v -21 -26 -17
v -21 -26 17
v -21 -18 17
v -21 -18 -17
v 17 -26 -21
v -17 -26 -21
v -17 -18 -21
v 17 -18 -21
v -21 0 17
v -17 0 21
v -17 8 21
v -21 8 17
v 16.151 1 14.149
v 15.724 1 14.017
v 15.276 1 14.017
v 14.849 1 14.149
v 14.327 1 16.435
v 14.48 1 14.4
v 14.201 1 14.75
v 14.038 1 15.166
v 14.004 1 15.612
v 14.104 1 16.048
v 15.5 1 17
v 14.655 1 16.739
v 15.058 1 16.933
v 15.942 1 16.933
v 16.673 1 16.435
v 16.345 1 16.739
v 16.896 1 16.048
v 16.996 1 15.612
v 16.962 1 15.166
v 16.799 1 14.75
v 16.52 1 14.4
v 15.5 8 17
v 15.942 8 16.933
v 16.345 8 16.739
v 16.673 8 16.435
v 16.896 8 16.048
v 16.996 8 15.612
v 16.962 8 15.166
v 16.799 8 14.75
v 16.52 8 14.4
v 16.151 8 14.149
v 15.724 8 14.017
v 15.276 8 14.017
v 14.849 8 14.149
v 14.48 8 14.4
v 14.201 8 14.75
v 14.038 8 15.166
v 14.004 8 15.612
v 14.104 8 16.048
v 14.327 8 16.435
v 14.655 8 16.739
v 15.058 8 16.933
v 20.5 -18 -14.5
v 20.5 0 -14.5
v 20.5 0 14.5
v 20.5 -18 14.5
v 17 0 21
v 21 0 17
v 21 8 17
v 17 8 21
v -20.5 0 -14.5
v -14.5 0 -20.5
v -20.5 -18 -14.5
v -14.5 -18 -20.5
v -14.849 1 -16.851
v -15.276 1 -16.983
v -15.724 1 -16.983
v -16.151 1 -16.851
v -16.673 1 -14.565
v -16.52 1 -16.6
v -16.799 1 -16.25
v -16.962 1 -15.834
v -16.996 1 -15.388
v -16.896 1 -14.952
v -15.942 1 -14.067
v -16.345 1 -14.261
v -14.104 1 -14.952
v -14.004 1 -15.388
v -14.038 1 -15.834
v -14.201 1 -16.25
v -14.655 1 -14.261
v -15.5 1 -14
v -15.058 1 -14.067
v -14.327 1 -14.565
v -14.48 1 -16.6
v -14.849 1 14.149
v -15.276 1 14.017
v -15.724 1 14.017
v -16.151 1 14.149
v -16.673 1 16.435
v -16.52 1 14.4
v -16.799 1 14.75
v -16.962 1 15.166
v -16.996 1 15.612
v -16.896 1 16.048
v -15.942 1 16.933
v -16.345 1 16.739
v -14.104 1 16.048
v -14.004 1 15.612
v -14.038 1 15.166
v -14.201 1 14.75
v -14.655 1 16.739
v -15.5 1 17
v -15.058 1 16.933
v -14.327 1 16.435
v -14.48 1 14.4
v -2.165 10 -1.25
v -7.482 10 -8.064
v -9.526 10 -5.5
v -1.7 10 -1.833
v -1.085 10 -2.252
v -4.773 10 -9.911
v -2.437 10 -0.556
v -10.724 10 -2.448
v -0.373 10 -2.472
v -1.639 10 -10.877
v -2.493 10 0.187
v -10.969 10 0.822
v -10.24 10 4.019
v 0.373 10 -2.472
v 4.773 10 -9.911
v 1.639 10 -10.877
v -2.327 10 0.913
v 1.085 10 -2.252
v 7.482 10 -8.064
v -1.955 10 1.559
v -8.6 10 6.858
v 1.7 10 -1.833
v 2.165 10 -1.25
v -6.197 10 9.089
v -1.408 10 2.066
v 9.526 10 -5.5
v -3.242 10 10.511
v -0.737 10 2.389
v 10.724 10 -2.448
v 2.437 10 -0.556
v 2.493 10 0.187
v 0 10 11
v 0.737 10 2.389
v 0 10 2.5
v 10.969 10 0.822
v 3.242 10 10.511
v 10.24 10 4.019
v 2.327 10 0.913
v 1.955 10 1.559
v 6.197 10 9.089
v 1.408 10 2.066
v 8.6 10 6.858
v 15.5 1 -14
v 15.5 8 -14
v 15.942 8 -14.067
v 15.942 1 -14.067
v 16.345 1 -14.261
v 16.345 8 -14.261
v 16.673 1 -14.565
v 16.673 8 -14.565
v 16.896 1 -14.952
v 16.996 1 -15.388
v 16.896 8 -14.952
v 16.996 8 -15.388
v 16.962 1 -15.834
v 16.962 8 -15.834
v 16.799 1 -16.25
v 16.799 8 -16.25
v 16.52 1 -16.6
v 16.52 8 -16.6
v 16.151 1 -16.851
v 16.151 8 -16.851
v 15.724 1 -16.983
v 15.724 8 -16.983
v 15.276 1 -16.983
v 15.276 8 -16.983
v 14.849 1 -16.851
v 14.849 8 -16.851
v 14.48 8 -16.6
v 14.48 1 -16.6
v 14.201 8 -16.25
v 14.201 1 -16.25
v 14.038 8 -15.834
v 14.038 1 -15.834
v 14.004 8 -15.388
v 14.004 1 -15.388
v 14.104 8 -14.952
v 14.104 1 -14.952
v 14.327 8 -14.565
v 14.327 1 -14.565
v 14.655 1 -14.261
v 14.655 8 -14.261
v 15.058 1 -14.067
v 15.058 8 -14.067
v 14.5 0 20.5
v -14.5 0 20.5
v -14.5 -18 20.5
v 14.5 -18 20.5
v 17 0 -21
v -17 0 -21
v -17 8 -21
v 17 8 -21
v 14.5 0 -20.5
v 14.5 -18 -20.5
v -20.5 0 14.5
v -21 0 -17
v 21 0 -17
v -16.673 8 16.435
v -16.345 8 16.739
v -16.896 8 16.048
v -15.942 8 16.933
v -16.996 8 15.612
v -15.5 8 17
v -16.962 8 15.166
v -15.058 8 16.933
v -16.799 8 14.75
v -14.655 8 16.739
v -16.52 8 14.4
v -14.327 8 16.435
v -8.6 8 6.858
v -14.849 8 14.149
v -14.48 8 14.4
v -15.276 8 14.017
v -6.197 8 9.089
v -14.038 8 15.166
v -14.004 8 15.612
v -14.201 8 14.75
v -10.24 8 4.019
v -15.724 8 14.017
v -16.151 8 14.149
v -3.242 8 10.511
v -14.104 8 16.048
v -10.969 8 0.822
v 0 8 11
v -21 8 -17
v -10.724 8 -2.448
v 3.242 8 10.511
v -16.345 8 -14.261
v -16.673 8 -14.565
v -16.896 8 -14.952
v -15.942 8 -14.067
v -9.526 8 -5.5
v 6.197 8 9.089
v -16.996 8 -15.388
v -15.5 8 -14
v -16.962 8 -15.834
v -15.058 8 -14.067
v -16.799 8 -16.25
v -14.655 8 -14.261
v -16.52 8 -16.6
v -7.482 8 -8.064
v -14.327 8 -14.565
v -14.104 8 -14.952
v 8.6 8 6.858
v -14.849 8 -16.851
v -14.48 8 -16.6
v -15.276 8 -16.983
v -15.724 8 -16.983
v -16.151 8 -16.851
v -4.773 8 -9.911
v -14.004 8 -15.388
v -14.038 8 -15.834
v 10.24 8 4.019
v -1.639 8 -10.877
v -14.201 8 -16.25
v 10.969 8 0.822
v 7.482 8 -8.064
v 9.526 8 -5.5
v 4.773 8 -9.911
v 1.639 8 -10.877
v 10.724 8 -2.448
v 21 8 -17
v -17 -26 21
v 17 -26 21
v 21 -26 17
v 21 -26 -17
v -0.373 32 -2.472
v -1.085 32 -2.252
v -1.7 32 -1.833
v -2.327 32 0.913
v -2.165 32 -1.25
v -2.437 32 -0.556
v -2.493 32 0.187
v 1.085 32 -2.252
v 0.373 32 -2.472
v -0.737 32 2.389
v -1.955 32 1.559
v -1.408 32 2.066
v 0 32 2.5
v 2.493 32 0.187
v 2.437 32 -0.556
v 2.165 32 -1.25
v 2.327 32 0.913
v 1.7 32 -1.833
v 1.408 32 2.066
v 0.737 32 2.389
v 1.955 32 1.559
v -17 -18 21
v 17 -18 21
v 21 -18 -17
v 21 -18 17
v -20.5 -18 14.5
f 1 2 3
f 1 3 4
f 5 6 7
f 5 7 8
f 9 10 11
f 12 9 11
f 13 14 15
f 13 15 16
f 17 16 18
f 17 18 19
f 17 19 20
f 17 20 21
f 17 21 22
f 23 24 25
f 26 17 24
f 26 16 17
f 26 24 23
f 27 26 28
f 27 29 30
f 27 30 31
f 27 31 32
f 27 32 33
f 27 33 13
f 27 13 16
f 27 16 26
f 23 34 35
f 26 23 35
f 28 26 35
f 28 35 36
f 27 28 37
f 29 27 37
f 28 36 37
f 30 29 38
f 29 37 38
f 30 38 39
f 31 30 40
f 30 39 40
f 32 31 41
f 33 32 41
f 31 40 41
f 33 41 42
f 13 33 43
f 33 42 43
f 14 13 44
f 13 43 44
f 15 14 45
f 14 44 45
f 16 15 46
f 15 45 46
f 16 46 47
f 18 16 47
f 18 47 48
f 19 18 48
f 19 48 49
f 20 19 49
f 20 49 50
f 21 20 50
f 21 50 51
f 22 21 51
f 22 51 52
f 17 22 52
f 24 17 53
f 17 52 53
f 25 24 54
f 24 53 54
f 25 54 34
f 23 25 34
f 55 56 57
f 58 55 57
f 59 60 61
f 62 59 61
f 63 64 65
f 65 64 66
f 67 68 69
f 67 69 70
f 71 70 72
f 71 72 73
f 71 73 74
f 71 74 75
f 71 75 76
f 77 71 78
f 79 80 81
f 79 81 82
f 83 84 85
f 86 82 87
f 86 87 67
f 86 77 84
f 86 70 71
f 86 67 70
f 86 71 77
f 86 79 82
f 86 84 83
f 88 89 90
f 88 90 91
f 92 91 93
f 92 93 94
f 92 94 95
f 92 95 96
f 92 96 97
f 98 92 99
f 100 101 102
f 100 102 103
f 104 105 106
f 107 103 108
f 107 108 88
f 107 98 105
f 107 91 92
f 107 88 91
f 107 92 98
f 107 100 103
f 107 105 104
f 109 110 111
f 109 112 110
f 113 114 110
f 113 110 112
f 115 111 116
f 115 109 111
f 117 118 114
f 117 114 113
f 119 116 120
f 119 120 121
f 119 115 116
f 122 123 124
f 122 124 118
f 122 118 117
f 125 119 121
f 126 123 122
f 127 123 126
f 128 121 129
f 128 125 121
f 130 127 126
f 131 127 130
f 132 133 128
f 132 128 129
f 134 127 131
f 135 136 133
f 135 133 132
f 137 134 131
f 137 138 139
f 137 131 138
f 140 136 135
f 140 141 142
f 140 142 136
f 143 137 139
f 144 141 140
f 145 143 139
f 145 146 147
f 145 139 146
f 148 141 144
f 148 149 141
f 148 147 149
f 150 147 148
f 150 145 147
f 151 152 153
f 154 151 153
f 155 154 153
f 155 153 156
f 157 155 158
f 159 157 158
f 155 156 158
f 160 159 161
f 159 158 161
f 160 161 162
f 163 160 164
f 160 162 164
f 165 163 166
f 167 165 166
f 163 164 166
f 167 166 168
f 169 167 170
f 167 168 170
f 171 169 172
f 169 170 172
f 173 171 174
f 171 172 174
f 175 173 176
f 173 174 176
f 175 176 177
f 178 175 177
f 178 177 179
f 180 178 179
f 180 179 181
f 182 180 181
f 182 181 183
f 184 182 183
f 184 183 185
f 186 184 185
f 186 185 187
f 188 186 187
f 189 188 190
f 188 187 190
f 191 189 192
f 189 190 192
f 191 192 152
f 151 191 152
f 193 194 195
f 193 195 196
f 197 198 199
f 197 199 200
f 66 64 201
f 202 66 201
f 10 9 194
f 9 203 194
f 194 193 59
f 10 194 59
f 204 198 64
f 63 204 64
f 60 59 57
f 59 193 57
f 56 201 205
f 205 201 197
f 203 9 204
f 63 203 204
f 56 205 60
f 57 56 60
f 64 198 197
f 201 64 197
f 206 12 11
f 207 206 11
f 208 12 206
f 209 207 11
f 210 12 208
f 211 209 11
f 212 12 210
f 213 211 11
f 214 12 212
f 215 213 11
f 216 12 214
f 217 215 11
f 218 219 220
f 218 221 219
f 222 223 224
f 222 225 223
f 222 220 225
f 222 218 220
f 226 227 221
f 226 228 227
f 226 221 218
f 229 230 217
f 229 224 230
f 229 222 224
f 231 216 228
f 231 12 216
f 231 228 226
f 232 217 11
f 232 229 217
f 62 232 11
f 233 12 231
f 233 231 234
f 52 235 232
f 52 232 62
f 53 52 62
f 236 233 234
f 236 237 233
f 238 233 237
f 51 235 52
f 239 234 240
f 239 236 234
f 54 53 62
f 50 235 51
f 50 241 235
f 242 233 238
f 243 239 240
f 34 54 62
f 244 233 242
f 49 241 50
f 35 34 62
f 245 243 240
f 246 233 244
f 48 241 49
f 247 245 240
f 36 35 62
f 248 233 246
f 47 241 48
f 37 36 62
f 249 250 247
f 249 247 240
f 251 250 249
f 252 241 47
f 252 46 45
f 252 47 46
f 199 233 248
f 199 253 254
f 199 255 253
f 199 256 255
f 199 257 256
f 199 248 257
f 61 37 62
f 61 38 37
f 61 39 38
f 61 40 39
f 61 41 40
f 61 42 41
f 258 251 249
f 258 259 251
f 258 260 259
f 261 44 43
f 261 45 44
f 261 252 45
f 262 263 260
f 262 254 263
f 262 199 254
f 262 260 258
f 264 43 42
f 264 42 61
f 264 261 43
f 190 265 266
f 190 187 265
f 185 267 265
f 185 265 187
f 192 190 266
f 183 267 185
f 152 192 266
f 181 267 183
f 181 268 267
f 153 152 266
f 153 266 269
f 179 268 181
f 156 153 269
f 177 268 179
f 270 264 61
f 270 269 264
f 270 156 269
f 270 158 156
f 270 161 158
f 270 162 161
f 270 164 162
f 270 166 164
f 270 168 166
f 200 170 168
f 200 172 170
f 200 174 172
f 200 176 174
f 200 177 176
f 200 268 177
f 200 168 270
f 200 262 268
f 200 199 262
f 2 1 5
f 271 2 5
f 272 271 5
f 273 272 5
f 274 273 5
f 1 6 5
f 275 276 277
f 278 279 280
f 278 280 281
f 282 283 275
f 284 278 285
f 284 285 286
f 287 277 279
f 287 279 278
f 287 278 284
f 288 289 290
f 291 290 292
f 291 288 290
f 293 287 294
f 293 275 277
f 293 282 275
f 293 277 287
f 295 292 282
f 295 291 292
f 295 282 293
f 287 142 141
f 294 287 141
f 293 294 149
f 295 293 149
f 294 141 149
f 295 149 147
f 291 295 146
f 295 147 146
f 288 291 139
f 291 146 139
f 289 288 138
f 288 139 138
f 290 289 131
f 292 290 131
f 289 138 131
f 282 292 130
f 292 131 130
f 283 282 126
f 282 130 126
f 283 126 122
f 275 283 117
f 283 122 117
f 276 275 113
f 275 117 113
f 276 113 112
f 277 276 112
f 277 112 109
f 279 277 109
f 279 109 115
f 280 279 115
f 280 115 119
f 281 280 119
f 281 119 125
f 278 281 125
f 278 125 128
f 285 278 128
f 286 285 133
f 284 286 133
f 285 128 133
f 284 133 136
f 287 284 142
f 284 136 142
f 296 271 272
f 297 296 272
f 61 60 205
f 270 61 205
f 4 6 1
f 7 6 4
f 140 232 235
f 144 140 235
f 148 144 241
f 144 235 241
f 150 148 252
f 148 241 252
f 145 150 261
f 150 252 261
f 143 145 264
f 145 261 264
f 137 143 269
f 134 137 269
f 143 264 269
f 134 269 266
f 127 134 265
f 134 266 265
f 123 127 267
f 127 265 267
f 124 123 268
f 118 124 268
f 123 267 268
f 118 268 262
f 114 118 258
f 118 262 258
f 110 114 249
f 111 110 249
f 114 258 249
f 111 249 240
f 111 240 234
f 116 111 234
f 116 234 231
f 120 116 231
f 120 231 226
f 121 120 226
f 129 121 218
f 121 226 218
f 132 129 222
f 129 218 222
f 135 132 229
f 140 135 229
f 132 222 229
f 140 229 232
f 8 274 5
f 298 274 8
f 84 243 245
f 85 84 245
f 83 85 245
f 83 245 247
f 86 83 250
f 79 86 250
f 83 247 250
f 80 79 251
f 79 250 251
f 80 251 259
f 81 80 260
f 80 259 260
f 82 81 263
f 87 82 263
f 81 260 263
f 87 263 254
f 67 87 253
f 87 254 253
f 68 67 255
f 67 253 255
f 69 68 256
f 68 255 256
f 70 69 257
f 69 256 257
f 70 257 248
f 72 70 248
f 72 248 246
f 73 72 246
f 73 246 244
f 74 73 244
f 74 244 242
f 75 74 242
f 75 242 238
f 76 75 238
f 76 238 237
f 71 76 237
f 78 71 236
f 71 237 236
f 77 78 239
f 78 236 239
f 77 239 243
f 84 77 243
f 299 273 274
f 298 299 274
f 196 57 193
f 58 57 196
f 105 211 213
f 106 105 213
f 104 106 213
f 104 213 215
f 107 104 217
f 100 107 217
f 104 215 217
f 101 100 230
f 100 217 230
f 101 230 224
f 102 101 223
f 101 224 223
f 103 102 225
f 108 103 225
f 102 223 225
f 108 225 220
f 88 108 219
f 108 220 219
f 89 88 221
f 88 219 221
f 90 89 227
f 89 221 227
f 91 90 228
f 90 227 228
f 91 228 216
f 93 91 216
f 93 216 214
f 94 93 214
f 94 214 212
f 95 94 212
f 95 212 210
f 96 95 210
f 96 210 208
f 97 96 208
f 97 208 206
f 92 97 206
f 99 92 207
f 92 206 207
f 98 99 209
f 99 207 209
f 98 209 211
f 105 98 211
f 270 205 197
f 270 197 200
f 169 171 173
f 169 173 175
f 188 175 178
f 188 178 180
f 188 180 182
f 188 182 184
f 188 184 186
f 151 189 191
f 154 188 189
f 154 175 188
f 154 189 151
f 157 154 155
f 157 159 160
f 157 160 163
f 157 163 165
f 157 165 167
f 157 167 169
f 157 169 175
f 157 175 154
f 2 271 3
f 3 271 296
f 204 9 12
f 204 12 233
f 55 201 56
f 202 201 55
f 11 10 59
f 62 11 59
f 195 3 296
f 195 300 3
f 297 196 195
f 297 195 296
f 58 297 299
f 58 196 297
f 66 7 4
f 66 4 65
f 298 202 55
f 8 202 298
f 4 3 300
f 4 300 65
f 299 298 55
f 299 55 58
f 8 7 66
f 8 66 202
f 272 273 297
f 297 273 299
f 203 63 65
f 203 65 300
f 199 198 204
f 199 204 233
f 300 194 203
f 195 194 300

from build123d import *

# Parameters (mm, degrees)
SKETCH1_W           = 42
SKETCH1_H           = 42
BOSS_EXTRUDE1_DEPTH = 8
LPATTERN2_COUNT     = 2
LPATTERN2_PITCH     = 26
BOSS_EXTRUDE4_REACH = 41.472
SKETCH5_W           = 41
SKETCH5_H           = 41
CHAMFER2_SIZE       = 6
CHAMFER1_SIZE       = 4
SKETCH2_R           = 11
BOSS_EXTRUDE2_DEPTH = 2
SKETCH3_R           = 2.5
BOSS_EXTRUDE3_DEPTH = 22
SKETCH6_R           = 1.5
CUT_EXTRUDE1_DEPTH  = 7


with BuildPart() as part:
    # Sketch1 → Boss-Extrude1 (new body)
    with BuildSketch(Plane(origin=(0, 0, 0), x_dir=(1, 0, 0), z_dir=(0, 1, 0))):
        Rectangle(SKETCH1_W, SKETCH1_H)
    extrude(amount=BOSS_EXTRUDE1_DEPTH)


with BuildPart() as lpattern2_1:
    # LPattern2: pattern copy
    add(part.part.moved(Location(Vector(0, -1, 0) * (1 * LPATTERN2_PITCH))))

    # Sketch5 → Boss-Extrude4 (add, up to next)
    with BuildSketch(Plane.XZ, mode=Mode.PRIVATE) as boss_extrude4_sk1:
        Rectangle(SKETCH5_W, SKETCH5_H)
    boss_extrude4_tool1 = extrude(boss_extrude4_sk1.sketch, amount=BOSS_EXTRUDE4_REACH, mode=Mode.PRIVATE) - lpattern2_1.part

    add(part.part)  # Boss-Extrude4 merges part
    add(boss_extrude4_tool1.solids().sort_by_distance((0, 0, 0))[0])

    # Chamfer2
    chamfer2_edges = [lpattern2_1.edges().sort_by_distance(p)[0] for p in [
        (20.5, -9, 20.5),
        (-20.5, -9, 20.5),
        (-20.5, -9, -20.5),
        (20.5, -9, -20.5),
    ]]
    chamfer(chamfer2_edges, length=CHAMFER2_SIZE)

    # Chamfer1
    chamfer1_edges = [lpattern2_1.edges().sort_by_distance(p)[0] for p in [
        (-21, -22, -21),
        (-21, -22, 21),
        (21, -22, 21),
        (21, -22, -21),
        (-21, 4, -21),
        (21, 4, -21),
        (21, 4, 21),
        (-21, 4, 21),
    ]]
    chamfer(chamfer1_edges, length=CHAMFER1_SIZE)

    # Sketch2 → Boss-Extrude2 (add)
    with BuildSketch(Plane(origin=(0, 8, 0), x_dir=(1, 0, 0), z_dir=(0, 1, 0))):
        with Locations(Location((0, 0, 0), (0, 0, 270))):
            Circle(SKETCH2_R)
    extrude(amount=BOSS_EXTRUDE2_DEPTH)

    # Sketch3 → Boss-Extrude3 (add)
    with BuildSketch(Plane(origin=(0, 10, 0), x_dir=(1, 0, 0), z_dir=(0, 1, 0))):
        with Locations(Location((0, 0, 0), (0, 0, 270))):
            Circle(SKETCH3_R)
    extrude(amount=BOSS_EXTRUDE3_DEPTH)

    # Sketch6 → Cut-Extrude1 (cut)
    with BuildSketch(Plane(origin=(0, 8, 0), x_dir=(1, 0, 0), z_dir=(0, 1, 0))):
        with Locations(Location((-15.5, 15.5, 0), (0, 0, 270))):
            Circle(SKETCH6_R)
        with Locations(Location((15.5, 15.5, 0), (0, 0, 270))):
            Circle(SKETCH6_R)
        with Locations(Location((15.5, -15.5, 0), (0, 0, 270))):
            Circle(SKETCH6_R)
        with Locations(Location((-15.5, -15.5, 0), (0, 0, 270))):
            Circle(SKETCH6_R)
    extrude(amount=-CUT_EXTRUDE1_DEPTH, mode=Mode.SUBTRACT)


solid = lpattern2_1.part
